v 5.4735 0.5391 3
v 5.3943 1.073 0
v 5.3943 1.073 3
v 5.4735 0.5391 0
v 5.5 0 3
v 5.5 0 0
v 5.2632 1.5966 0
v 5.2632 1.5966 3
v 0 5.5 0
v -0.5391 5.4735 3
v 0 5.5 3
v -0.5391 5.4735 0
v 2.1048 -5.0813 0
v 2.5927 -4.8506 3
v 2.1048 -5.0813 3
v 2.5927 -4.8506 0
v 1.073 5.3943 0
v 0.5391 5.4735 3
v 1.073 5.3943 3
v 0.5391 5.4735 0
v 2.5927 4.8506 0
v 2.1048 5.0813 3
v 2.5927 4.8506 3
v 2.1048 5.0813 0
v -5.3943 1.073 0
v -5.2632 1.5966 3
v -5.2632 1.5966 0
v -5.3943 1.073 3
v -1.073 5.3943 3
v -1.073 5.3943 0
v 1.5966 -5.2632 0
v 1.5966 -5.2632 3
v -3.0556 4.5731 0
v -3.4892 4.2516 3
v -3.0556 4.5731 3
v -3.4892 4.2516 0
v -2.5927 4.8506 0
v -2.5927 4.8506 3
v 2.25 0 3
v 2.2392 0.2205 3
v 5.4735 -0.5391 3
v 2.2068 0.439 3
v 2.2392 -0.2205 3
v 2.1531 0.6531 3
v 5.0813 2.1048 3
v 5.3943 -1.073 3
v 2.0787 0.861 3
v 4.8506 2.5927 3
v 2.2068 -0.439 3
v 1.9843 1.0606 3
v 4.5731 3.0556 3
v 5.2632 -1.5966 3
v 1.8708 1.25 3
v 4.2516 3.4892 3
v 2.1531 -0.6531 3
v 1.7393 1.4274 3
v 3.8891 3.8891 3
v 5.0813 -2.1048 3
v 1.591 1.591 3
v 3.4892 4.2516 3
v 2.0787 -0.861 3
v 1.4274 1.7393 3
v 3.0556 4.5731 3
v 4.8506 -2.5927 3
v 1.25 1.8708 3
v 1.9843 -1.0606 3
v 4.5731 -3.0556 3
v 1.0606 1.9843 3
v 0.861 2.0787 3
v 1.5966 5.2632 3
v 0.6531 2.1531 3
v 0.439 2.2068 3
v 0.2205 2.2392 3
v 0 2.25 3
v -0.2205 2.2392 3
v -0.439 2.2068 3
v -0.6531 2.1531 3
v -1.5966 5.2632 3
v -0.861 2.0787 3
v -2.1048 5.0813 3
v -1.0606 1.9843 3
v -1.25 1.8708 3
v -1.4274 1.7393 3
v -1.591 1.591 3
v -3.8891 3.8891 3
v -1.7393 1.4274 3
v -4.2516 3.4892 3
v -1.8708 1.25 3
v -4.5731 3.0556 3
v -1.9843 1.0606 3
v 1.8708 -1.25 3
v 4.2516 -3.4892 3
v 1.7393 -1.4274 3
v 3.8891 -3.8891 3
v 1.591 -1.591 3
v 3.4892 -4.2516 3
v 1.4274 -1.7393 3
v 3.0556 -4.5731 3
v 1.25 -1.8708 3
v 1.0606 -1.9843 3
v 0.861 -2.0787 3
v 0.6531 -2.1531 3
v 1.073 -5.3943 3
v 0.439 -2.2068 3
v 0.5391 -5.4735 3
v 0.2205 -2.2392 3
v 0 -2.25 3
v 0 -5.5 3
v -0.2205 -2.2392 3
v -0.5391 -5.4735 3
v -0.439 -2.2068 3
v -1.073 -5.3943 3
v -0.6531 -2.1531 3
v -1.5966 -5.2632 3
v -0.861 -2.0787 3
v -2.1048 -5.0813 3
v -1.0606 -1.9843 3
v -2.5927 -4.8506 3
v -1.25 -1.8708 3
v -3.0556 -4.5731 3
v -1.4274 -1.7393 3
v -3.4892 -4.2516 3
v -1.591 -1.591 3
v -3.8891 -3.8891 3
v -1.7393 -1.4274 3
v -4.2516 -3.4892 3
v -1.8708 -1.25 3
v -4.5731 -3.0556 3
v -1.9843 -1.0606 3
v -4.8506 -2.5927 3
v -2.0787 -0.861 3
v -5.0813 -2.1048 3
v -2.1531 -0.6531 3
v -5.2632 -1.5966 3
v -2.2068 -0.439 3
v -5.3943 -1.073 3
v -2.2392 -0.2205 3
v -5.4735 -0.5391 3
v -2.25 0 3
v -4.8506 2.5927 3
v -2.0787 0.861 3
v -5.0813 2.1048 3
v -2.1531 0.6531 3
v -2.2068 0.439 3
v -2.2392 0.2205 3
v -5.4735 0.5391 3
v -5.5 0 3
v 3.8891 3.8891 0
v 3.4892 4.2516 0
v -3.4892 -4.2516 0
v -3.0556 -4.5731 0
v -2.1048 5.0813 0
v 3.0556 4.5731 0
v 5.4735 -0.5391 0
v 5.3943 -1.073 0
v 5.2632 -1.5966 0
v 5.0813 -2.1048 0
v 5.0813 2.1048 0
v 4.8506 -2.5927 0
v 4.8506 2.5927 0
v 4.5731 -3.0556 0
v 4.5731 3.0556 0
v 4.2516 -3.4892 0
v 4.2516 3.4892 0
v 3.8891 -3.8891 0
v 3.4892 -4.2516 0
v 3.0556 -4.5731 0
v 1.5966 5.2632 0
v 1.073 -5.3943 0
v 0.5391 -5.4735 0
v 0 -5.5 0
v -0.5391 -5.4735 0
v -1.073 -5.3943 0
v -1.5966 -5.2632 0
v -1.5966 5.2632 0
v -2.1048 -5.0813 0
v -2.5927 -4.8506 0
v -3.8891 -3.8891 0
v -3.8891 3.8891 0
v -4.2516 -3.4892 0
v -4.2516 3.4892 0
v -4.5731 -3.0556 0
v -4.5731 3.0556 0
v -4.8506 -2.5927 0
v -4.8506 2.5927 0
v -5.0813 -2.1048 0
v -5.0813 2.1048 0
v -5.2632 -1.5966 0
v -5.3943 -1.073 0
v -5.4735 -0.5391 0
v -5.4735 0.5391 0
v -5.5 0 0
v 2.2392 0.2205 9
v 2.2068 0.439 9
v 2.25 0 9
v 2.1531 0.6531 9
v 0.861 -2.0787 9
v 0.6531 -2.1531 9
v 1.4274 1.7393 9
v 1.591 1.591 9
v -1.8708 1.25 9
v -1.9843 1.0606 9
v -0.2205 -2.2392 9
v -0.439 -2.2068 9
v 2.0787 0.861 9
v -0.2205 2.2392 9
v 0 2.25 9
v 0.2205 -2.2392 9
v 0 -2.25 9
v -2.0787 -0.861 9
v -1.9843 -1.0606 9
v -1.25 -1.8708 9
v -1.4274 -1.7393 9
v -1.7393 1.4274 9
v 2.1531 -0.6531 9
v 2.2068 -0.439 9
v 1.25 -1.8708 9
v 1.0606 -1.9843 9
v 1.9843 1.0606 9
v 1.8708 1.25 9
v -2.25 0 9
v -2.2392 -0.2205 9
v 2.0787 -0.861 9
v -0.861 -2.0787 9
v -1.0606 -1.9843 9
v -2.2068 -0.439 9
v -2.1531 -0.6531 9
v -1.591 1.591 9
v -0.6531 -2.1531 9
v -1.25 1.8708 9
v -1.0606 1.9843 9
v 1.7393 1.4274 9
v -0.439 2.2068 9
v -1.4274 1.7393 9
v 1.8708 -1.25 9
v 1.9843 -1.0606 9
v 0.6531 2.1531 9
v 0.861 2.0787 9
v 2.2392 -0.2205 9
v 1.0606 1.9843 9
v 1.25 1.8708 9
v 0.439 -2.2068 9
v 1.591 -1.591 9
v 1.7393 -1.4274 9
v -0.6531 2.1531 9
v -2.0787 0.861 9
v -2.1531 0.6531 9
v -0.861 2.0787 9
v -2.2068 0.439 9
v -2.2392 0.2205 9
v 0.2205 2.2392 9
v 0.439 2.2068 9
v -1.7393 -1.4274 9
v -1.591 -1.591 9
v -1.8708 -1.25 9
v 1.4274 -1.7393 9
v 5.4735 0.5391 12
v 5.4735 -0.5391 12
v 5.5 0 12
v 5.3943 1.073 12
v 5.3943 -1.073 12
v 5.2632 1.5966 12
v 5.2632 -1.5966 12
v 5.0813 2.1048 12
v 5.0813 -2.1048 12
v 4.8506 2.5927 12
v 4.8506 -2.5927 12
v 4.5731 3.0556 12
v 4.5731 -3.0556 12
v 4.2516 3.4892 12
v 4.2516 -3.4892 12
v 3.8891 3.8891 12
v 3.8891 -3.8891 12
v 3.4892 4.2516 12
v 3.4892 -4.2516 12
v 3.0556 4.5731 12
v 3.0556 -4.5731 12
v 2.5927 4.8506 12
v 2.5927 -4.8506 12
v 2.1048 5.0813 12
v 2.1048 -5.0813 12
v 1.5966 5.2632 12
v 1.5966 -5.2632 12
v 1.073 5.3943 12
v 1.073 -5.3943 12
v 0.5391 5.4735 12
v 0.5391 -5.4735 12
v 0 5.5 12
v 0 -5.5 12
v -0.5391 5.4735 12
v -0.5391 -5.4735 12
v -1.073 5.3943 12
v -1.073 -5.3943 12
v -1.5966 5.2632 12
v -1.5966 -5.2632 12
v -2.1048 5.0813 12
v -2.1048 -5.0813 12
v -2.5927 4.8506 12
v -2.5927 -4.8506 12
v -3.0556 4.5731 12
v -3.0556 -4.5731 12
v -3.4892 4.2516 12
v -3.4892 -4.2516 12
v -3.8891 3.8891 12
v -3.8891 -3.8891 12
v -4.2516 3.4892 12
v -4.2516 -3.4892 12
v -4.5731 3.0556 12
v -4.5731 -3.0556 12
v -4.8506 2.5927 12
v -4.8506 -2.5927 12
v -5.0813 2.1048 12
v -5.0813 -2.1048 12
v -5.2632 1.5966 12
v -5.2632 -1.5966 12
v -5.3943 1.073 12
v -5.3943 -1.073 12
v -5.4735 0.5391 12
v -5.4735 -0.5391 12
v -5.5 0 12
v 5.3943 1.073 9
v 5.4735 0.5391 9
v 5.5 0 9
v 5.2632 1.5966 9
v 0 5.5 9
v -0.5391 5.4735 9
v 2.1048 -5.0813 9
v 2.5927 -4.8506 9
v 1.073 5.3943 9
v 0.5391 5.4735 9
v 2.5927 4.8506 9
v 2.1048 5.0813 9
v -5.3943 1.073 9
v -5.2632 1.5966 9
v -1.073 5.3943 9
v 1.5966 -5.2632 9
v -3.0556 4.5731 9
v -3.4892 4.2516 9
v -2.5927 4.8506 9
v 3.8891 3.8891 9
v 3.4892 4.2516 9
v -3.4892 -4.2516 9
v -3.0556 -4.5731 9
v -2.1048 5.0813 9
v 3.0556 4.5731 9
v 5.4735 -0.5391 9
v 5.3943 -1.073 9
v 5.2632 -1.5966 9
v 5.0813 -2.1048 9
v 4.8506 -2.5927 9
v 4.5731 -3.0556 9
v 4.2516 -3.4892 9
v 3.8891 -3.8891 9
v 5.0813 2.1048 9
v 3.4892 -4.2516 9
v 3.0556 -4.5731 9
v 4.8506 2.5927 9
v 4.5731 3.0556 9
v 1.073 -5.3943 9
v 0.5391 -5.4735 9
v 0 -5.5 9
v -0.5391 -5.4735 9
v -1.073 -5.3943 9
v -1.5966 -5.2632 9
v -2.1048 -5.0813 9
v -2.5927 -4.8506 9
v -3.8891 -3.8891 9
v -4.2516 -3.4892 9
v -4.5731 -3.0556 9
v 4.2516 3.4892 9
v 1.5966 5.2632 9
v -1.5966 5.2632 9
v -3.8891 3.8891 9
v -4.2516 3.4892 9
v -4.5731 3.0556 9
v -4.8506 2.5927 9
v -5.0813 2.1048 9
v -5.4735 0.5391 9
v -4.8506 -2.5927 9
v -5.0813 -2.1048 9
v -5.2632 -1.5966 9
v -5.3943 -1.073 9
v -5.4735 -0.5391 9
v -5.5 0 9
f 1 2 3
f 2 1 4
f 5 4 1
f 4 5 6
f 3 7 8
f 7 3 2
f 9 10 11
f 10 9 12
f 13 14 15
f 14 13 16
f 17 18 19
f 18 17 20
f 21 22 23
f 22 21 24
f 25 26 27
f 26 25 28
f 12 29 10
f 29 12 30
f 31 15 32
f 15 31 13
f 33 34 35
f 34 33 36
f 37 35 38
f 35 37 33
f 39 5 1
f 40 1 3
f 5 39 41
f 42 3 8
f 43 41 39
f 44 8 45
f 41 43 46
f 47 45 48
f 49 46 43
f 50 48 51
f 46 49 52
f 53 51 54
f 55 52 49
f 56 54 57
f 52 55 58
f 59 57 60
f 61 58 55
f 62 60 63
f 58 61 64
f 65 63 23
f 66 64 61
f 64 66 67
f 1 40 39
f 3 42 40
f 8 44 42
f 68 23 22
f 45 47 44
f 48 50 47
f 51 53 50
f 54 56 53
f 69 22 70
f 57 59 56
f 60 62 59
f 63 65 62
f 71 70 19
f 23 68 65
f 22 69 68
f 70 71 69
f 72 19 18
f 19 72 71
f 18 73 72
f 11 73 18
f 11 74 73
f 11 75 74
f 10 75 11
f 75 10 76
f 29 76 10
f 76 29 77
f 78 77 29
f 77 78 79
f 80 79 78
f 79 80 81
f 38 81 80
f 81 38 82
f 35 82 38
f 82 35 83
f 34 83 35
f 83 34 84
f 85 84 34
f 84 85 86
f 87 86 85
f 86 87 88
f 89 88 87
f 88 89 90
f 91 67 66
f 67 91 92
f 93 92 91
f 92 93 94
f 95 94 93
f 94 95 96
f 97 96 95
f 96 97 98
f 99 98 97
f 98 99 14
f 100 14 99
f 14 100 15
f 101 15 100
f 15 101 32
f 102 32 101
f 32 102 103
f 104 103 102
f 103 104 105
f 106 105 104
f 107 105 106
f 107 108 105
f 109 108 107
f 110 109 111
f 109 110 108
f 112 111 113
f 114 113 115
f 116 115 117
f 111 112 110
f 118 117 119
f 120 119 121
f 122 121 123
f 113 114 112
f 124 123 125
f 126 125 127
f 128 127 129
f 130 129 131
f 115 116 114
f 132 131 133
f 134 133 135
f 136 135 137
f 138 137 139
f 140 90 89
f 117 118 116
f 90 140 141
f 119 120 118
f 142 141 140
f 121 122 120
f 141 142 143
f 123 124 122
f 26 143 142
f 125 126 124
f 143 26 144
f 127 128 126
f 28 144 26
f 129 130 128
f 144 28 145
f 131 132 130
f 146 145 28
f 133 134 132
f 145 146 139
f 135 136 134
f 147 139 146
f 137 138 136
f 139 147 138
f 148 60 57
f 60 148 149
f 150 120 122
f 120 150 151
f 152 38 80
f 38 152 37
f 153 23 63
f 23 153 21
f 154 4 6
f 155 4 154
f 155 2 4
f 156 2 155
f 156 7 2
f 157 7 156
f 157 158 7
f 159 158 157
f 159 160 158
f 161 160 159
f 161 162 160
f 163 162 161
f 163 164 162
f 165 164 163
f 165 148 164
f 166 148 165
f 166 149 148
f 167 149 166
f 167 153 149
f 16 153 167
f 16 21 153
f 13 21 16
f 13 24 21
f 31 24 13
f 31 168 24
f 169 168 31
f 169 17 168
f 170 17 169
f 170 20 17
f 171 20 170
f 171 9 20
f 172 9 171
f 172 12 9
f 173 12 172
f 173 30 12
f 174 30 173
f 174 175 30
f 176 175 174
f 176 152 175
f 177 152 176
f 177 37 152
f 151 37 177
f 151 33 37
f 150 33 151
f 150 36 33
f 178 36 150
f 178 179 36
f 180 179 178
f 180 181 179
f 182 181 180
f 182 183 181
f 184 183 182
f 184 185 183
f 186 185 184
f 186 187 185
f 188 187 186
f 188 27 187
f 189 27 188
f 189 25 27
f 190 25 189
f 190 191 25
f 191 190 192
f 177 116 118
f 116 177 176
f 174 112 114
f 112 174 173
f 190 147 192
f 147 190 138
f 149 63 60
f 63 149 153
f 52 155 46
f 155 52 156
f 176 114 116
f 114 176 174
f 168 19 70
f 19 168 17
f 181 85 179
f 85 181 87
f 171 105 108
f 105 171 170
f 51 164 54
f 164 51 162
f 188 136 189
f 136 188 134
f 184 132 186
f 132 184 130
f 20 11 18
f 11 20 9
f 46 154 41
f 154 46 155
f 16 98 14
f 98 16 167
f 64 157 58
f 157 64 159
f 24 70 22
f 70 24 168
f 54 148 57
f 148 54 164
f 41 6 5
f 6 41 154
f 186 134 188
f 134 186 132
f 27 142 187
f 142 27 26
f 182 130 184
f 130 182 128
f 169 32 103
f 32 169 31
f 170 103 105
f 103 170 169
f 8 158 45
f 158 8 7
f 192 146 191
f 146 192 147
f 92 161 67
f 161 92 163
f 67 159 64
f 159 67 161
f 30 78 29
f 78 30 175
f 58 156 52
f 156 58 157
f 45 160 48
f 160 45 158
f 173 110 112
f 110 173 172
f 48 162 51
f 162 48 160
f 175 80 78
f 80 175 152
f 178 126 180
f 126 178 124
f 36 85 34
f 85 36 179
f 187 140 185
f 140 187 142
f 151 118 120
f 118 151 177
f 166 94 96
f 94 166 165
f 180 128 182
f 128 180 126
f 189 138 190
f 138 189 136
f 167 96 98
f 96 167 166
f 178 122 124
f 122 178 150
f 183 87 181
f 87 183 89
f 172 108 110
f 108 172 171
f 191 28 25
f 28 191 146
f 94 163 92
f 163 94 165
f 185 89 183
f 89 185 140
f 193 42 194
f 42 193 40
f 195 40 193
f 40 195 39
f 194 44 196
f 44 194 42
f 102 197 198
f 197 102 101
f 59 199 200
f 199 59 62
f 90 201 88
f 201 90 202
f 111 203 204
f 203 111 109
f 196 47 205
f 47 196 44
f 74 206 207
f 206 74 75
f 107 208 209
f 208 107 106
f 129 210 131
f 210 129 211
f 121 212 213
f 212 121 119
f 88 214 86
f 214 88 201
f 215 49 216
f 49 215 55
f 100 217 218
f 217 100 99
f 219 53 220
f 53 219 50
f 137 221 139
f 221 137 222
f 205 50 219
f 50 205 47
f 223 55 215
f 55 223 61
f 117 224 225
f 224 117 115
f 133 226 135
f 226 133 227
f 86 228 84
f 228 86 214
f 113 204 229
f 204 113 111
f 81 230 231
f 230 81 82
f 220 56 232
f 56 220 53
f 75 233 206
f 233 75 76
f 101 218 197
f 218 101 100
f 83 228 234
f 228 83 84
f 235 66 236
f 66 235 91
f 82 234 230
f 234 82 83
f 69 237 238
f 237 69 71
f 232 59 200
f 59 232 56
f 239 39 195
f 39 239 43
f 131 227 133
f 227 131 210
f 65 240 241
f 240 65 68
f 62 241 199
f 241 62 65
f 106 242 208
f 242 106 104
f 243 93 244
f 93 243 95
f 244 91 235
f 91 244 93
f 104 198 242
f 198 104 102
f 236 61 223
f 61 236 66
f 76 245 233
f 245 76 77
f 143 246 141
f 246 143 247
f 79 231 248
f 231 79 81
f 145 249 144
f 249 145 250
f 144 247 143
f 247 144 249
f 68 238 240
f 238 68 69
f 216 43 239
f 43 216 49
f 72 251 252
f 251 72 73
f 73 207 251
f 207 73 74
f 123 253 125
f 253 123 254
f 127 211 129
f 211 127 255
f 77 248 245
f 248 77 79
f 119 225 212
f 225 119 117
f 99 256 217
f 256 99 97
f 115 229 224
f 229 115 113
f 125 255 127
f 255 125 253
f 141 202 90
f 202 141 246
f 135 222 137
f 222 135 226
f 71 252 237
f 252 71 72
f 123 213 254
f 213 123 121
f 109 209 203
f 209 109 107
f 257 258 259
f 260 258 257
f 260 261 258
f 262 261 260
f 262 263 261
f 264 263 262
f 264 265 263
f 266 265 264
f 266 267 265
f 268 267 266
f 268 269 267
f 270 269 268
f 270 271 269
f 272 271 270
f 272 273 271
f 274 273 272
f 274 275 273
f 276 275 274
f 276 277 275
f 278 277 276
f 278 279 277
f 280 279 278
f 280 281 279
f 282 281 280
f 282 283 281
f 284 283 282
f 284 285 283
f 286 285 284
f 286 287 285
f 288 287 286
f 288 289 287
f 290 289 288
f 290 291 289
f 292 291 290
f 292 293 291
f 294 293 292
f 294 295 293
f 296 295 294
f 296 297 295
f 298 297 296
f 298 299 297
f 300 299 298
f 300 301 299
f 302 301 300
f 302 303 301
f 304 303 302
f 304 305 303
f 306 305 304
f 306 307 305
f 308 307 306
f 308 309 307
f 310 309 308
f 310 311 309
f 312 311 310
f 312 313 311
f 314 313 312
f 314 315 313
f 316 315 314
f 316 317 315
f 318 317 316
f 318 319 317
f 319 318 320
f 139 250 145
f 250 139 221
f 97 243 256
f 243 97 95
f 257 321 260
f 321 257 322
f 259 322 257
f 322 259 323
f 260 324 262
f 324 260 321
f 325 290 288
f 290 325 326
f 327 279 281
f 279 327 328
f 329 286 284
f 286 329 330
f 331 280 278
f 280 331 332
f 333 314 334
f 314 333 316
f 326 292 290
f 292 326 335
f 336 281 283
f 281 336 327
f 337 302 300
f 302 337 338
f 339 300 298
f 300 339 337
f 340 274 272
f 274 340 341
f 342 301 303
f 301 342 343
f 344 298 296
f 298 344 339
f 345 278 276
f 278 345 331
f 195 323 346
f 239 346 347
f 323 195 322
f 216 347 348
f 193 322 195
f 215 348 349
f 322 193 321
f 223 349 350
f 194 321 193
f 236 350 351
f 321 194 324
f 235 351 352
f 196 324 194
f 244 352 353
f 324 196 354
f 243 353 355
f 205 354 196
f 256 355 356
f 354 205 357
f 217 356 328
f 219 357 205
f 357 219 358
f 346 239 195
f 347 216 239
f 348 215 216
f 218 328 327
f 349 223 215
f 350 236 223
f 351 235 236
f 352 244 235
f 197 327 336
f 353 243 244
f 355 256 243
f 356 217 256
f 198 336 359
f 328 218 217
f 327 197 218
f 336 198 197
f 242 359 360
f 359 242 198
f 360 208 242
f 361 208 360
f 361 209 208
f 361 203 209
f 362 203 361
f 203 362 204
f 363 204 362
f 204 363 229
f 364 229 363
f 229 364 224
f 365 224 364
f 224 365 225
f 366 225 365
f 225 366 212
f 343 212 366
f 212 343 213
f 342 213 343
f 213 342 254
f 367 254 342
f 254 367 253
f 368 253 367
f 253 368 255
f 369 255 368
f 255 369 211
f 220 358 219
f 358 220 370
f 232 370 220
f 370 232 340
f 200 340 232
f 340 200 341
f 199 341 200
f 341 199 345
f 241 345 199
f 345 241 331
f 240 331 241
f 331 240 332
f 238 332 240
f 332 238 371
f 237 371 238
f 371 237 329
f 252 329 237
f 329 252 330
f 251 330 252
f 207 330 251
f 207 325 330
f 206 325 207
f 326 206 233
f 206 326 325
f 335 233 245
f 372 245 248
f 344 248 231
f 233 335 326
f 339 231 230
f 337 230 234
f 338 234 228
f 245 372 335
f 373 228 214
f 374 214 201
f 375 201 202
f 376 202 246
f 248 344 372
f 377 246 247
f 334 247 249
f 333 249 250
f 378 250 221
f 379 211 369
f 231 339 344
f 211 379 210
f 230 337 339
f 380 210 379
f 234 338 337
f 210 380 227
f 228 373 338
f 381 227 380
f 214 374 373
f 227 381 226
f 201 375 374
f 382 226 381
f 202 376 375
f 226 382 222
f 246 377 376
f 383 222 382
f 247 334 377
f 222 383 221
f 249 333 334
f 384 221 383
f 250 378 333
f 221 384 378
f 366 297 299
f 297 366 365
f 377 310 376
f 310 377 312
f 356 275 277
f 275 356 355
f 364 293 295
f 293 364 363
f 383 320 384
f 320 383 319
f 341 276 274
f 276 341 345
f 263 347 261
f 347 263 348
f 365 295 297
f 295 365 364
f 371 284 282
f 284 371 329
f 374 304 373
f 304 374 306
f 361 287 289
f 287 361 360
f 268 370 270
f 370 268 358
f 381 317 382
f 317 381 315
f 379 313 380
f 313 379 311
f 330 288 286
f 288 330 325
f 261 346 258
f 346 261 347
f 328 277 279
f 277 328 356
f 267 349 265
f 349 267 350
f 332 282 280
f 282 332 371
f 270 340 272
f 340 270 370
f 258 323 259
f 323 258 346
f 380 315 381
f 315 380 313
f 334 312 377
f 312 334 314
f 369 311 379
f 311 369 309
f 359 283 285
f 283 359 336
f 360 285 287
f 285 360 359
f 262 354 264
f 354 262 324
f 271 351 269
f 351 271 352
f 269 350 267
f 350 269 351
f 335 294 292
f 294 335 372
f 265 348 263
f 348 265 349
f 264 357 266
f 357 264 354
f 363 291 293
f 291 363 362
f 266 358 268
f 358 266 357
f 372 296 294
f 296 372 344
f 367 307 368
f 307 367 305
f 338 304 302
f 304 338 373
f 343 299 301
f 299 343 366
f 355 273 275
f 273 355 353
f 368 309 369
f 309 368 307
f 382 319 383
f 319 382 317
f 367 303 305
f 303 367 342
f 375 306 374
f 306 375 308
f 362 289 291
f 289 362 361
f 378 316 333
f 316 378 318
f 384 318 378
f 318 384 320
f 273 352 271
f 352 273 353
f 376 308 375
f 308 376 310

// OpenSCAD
translate([0,0,1.5])cylinder(d=11, h=3,center=true, $fn=64);
translate([0,0,6])cylinder(d=4.5, h=12, center=true, $fn=64);
translate([0,0,10.5])cylinder(d=11, h=3,center=true, $fn=64);
